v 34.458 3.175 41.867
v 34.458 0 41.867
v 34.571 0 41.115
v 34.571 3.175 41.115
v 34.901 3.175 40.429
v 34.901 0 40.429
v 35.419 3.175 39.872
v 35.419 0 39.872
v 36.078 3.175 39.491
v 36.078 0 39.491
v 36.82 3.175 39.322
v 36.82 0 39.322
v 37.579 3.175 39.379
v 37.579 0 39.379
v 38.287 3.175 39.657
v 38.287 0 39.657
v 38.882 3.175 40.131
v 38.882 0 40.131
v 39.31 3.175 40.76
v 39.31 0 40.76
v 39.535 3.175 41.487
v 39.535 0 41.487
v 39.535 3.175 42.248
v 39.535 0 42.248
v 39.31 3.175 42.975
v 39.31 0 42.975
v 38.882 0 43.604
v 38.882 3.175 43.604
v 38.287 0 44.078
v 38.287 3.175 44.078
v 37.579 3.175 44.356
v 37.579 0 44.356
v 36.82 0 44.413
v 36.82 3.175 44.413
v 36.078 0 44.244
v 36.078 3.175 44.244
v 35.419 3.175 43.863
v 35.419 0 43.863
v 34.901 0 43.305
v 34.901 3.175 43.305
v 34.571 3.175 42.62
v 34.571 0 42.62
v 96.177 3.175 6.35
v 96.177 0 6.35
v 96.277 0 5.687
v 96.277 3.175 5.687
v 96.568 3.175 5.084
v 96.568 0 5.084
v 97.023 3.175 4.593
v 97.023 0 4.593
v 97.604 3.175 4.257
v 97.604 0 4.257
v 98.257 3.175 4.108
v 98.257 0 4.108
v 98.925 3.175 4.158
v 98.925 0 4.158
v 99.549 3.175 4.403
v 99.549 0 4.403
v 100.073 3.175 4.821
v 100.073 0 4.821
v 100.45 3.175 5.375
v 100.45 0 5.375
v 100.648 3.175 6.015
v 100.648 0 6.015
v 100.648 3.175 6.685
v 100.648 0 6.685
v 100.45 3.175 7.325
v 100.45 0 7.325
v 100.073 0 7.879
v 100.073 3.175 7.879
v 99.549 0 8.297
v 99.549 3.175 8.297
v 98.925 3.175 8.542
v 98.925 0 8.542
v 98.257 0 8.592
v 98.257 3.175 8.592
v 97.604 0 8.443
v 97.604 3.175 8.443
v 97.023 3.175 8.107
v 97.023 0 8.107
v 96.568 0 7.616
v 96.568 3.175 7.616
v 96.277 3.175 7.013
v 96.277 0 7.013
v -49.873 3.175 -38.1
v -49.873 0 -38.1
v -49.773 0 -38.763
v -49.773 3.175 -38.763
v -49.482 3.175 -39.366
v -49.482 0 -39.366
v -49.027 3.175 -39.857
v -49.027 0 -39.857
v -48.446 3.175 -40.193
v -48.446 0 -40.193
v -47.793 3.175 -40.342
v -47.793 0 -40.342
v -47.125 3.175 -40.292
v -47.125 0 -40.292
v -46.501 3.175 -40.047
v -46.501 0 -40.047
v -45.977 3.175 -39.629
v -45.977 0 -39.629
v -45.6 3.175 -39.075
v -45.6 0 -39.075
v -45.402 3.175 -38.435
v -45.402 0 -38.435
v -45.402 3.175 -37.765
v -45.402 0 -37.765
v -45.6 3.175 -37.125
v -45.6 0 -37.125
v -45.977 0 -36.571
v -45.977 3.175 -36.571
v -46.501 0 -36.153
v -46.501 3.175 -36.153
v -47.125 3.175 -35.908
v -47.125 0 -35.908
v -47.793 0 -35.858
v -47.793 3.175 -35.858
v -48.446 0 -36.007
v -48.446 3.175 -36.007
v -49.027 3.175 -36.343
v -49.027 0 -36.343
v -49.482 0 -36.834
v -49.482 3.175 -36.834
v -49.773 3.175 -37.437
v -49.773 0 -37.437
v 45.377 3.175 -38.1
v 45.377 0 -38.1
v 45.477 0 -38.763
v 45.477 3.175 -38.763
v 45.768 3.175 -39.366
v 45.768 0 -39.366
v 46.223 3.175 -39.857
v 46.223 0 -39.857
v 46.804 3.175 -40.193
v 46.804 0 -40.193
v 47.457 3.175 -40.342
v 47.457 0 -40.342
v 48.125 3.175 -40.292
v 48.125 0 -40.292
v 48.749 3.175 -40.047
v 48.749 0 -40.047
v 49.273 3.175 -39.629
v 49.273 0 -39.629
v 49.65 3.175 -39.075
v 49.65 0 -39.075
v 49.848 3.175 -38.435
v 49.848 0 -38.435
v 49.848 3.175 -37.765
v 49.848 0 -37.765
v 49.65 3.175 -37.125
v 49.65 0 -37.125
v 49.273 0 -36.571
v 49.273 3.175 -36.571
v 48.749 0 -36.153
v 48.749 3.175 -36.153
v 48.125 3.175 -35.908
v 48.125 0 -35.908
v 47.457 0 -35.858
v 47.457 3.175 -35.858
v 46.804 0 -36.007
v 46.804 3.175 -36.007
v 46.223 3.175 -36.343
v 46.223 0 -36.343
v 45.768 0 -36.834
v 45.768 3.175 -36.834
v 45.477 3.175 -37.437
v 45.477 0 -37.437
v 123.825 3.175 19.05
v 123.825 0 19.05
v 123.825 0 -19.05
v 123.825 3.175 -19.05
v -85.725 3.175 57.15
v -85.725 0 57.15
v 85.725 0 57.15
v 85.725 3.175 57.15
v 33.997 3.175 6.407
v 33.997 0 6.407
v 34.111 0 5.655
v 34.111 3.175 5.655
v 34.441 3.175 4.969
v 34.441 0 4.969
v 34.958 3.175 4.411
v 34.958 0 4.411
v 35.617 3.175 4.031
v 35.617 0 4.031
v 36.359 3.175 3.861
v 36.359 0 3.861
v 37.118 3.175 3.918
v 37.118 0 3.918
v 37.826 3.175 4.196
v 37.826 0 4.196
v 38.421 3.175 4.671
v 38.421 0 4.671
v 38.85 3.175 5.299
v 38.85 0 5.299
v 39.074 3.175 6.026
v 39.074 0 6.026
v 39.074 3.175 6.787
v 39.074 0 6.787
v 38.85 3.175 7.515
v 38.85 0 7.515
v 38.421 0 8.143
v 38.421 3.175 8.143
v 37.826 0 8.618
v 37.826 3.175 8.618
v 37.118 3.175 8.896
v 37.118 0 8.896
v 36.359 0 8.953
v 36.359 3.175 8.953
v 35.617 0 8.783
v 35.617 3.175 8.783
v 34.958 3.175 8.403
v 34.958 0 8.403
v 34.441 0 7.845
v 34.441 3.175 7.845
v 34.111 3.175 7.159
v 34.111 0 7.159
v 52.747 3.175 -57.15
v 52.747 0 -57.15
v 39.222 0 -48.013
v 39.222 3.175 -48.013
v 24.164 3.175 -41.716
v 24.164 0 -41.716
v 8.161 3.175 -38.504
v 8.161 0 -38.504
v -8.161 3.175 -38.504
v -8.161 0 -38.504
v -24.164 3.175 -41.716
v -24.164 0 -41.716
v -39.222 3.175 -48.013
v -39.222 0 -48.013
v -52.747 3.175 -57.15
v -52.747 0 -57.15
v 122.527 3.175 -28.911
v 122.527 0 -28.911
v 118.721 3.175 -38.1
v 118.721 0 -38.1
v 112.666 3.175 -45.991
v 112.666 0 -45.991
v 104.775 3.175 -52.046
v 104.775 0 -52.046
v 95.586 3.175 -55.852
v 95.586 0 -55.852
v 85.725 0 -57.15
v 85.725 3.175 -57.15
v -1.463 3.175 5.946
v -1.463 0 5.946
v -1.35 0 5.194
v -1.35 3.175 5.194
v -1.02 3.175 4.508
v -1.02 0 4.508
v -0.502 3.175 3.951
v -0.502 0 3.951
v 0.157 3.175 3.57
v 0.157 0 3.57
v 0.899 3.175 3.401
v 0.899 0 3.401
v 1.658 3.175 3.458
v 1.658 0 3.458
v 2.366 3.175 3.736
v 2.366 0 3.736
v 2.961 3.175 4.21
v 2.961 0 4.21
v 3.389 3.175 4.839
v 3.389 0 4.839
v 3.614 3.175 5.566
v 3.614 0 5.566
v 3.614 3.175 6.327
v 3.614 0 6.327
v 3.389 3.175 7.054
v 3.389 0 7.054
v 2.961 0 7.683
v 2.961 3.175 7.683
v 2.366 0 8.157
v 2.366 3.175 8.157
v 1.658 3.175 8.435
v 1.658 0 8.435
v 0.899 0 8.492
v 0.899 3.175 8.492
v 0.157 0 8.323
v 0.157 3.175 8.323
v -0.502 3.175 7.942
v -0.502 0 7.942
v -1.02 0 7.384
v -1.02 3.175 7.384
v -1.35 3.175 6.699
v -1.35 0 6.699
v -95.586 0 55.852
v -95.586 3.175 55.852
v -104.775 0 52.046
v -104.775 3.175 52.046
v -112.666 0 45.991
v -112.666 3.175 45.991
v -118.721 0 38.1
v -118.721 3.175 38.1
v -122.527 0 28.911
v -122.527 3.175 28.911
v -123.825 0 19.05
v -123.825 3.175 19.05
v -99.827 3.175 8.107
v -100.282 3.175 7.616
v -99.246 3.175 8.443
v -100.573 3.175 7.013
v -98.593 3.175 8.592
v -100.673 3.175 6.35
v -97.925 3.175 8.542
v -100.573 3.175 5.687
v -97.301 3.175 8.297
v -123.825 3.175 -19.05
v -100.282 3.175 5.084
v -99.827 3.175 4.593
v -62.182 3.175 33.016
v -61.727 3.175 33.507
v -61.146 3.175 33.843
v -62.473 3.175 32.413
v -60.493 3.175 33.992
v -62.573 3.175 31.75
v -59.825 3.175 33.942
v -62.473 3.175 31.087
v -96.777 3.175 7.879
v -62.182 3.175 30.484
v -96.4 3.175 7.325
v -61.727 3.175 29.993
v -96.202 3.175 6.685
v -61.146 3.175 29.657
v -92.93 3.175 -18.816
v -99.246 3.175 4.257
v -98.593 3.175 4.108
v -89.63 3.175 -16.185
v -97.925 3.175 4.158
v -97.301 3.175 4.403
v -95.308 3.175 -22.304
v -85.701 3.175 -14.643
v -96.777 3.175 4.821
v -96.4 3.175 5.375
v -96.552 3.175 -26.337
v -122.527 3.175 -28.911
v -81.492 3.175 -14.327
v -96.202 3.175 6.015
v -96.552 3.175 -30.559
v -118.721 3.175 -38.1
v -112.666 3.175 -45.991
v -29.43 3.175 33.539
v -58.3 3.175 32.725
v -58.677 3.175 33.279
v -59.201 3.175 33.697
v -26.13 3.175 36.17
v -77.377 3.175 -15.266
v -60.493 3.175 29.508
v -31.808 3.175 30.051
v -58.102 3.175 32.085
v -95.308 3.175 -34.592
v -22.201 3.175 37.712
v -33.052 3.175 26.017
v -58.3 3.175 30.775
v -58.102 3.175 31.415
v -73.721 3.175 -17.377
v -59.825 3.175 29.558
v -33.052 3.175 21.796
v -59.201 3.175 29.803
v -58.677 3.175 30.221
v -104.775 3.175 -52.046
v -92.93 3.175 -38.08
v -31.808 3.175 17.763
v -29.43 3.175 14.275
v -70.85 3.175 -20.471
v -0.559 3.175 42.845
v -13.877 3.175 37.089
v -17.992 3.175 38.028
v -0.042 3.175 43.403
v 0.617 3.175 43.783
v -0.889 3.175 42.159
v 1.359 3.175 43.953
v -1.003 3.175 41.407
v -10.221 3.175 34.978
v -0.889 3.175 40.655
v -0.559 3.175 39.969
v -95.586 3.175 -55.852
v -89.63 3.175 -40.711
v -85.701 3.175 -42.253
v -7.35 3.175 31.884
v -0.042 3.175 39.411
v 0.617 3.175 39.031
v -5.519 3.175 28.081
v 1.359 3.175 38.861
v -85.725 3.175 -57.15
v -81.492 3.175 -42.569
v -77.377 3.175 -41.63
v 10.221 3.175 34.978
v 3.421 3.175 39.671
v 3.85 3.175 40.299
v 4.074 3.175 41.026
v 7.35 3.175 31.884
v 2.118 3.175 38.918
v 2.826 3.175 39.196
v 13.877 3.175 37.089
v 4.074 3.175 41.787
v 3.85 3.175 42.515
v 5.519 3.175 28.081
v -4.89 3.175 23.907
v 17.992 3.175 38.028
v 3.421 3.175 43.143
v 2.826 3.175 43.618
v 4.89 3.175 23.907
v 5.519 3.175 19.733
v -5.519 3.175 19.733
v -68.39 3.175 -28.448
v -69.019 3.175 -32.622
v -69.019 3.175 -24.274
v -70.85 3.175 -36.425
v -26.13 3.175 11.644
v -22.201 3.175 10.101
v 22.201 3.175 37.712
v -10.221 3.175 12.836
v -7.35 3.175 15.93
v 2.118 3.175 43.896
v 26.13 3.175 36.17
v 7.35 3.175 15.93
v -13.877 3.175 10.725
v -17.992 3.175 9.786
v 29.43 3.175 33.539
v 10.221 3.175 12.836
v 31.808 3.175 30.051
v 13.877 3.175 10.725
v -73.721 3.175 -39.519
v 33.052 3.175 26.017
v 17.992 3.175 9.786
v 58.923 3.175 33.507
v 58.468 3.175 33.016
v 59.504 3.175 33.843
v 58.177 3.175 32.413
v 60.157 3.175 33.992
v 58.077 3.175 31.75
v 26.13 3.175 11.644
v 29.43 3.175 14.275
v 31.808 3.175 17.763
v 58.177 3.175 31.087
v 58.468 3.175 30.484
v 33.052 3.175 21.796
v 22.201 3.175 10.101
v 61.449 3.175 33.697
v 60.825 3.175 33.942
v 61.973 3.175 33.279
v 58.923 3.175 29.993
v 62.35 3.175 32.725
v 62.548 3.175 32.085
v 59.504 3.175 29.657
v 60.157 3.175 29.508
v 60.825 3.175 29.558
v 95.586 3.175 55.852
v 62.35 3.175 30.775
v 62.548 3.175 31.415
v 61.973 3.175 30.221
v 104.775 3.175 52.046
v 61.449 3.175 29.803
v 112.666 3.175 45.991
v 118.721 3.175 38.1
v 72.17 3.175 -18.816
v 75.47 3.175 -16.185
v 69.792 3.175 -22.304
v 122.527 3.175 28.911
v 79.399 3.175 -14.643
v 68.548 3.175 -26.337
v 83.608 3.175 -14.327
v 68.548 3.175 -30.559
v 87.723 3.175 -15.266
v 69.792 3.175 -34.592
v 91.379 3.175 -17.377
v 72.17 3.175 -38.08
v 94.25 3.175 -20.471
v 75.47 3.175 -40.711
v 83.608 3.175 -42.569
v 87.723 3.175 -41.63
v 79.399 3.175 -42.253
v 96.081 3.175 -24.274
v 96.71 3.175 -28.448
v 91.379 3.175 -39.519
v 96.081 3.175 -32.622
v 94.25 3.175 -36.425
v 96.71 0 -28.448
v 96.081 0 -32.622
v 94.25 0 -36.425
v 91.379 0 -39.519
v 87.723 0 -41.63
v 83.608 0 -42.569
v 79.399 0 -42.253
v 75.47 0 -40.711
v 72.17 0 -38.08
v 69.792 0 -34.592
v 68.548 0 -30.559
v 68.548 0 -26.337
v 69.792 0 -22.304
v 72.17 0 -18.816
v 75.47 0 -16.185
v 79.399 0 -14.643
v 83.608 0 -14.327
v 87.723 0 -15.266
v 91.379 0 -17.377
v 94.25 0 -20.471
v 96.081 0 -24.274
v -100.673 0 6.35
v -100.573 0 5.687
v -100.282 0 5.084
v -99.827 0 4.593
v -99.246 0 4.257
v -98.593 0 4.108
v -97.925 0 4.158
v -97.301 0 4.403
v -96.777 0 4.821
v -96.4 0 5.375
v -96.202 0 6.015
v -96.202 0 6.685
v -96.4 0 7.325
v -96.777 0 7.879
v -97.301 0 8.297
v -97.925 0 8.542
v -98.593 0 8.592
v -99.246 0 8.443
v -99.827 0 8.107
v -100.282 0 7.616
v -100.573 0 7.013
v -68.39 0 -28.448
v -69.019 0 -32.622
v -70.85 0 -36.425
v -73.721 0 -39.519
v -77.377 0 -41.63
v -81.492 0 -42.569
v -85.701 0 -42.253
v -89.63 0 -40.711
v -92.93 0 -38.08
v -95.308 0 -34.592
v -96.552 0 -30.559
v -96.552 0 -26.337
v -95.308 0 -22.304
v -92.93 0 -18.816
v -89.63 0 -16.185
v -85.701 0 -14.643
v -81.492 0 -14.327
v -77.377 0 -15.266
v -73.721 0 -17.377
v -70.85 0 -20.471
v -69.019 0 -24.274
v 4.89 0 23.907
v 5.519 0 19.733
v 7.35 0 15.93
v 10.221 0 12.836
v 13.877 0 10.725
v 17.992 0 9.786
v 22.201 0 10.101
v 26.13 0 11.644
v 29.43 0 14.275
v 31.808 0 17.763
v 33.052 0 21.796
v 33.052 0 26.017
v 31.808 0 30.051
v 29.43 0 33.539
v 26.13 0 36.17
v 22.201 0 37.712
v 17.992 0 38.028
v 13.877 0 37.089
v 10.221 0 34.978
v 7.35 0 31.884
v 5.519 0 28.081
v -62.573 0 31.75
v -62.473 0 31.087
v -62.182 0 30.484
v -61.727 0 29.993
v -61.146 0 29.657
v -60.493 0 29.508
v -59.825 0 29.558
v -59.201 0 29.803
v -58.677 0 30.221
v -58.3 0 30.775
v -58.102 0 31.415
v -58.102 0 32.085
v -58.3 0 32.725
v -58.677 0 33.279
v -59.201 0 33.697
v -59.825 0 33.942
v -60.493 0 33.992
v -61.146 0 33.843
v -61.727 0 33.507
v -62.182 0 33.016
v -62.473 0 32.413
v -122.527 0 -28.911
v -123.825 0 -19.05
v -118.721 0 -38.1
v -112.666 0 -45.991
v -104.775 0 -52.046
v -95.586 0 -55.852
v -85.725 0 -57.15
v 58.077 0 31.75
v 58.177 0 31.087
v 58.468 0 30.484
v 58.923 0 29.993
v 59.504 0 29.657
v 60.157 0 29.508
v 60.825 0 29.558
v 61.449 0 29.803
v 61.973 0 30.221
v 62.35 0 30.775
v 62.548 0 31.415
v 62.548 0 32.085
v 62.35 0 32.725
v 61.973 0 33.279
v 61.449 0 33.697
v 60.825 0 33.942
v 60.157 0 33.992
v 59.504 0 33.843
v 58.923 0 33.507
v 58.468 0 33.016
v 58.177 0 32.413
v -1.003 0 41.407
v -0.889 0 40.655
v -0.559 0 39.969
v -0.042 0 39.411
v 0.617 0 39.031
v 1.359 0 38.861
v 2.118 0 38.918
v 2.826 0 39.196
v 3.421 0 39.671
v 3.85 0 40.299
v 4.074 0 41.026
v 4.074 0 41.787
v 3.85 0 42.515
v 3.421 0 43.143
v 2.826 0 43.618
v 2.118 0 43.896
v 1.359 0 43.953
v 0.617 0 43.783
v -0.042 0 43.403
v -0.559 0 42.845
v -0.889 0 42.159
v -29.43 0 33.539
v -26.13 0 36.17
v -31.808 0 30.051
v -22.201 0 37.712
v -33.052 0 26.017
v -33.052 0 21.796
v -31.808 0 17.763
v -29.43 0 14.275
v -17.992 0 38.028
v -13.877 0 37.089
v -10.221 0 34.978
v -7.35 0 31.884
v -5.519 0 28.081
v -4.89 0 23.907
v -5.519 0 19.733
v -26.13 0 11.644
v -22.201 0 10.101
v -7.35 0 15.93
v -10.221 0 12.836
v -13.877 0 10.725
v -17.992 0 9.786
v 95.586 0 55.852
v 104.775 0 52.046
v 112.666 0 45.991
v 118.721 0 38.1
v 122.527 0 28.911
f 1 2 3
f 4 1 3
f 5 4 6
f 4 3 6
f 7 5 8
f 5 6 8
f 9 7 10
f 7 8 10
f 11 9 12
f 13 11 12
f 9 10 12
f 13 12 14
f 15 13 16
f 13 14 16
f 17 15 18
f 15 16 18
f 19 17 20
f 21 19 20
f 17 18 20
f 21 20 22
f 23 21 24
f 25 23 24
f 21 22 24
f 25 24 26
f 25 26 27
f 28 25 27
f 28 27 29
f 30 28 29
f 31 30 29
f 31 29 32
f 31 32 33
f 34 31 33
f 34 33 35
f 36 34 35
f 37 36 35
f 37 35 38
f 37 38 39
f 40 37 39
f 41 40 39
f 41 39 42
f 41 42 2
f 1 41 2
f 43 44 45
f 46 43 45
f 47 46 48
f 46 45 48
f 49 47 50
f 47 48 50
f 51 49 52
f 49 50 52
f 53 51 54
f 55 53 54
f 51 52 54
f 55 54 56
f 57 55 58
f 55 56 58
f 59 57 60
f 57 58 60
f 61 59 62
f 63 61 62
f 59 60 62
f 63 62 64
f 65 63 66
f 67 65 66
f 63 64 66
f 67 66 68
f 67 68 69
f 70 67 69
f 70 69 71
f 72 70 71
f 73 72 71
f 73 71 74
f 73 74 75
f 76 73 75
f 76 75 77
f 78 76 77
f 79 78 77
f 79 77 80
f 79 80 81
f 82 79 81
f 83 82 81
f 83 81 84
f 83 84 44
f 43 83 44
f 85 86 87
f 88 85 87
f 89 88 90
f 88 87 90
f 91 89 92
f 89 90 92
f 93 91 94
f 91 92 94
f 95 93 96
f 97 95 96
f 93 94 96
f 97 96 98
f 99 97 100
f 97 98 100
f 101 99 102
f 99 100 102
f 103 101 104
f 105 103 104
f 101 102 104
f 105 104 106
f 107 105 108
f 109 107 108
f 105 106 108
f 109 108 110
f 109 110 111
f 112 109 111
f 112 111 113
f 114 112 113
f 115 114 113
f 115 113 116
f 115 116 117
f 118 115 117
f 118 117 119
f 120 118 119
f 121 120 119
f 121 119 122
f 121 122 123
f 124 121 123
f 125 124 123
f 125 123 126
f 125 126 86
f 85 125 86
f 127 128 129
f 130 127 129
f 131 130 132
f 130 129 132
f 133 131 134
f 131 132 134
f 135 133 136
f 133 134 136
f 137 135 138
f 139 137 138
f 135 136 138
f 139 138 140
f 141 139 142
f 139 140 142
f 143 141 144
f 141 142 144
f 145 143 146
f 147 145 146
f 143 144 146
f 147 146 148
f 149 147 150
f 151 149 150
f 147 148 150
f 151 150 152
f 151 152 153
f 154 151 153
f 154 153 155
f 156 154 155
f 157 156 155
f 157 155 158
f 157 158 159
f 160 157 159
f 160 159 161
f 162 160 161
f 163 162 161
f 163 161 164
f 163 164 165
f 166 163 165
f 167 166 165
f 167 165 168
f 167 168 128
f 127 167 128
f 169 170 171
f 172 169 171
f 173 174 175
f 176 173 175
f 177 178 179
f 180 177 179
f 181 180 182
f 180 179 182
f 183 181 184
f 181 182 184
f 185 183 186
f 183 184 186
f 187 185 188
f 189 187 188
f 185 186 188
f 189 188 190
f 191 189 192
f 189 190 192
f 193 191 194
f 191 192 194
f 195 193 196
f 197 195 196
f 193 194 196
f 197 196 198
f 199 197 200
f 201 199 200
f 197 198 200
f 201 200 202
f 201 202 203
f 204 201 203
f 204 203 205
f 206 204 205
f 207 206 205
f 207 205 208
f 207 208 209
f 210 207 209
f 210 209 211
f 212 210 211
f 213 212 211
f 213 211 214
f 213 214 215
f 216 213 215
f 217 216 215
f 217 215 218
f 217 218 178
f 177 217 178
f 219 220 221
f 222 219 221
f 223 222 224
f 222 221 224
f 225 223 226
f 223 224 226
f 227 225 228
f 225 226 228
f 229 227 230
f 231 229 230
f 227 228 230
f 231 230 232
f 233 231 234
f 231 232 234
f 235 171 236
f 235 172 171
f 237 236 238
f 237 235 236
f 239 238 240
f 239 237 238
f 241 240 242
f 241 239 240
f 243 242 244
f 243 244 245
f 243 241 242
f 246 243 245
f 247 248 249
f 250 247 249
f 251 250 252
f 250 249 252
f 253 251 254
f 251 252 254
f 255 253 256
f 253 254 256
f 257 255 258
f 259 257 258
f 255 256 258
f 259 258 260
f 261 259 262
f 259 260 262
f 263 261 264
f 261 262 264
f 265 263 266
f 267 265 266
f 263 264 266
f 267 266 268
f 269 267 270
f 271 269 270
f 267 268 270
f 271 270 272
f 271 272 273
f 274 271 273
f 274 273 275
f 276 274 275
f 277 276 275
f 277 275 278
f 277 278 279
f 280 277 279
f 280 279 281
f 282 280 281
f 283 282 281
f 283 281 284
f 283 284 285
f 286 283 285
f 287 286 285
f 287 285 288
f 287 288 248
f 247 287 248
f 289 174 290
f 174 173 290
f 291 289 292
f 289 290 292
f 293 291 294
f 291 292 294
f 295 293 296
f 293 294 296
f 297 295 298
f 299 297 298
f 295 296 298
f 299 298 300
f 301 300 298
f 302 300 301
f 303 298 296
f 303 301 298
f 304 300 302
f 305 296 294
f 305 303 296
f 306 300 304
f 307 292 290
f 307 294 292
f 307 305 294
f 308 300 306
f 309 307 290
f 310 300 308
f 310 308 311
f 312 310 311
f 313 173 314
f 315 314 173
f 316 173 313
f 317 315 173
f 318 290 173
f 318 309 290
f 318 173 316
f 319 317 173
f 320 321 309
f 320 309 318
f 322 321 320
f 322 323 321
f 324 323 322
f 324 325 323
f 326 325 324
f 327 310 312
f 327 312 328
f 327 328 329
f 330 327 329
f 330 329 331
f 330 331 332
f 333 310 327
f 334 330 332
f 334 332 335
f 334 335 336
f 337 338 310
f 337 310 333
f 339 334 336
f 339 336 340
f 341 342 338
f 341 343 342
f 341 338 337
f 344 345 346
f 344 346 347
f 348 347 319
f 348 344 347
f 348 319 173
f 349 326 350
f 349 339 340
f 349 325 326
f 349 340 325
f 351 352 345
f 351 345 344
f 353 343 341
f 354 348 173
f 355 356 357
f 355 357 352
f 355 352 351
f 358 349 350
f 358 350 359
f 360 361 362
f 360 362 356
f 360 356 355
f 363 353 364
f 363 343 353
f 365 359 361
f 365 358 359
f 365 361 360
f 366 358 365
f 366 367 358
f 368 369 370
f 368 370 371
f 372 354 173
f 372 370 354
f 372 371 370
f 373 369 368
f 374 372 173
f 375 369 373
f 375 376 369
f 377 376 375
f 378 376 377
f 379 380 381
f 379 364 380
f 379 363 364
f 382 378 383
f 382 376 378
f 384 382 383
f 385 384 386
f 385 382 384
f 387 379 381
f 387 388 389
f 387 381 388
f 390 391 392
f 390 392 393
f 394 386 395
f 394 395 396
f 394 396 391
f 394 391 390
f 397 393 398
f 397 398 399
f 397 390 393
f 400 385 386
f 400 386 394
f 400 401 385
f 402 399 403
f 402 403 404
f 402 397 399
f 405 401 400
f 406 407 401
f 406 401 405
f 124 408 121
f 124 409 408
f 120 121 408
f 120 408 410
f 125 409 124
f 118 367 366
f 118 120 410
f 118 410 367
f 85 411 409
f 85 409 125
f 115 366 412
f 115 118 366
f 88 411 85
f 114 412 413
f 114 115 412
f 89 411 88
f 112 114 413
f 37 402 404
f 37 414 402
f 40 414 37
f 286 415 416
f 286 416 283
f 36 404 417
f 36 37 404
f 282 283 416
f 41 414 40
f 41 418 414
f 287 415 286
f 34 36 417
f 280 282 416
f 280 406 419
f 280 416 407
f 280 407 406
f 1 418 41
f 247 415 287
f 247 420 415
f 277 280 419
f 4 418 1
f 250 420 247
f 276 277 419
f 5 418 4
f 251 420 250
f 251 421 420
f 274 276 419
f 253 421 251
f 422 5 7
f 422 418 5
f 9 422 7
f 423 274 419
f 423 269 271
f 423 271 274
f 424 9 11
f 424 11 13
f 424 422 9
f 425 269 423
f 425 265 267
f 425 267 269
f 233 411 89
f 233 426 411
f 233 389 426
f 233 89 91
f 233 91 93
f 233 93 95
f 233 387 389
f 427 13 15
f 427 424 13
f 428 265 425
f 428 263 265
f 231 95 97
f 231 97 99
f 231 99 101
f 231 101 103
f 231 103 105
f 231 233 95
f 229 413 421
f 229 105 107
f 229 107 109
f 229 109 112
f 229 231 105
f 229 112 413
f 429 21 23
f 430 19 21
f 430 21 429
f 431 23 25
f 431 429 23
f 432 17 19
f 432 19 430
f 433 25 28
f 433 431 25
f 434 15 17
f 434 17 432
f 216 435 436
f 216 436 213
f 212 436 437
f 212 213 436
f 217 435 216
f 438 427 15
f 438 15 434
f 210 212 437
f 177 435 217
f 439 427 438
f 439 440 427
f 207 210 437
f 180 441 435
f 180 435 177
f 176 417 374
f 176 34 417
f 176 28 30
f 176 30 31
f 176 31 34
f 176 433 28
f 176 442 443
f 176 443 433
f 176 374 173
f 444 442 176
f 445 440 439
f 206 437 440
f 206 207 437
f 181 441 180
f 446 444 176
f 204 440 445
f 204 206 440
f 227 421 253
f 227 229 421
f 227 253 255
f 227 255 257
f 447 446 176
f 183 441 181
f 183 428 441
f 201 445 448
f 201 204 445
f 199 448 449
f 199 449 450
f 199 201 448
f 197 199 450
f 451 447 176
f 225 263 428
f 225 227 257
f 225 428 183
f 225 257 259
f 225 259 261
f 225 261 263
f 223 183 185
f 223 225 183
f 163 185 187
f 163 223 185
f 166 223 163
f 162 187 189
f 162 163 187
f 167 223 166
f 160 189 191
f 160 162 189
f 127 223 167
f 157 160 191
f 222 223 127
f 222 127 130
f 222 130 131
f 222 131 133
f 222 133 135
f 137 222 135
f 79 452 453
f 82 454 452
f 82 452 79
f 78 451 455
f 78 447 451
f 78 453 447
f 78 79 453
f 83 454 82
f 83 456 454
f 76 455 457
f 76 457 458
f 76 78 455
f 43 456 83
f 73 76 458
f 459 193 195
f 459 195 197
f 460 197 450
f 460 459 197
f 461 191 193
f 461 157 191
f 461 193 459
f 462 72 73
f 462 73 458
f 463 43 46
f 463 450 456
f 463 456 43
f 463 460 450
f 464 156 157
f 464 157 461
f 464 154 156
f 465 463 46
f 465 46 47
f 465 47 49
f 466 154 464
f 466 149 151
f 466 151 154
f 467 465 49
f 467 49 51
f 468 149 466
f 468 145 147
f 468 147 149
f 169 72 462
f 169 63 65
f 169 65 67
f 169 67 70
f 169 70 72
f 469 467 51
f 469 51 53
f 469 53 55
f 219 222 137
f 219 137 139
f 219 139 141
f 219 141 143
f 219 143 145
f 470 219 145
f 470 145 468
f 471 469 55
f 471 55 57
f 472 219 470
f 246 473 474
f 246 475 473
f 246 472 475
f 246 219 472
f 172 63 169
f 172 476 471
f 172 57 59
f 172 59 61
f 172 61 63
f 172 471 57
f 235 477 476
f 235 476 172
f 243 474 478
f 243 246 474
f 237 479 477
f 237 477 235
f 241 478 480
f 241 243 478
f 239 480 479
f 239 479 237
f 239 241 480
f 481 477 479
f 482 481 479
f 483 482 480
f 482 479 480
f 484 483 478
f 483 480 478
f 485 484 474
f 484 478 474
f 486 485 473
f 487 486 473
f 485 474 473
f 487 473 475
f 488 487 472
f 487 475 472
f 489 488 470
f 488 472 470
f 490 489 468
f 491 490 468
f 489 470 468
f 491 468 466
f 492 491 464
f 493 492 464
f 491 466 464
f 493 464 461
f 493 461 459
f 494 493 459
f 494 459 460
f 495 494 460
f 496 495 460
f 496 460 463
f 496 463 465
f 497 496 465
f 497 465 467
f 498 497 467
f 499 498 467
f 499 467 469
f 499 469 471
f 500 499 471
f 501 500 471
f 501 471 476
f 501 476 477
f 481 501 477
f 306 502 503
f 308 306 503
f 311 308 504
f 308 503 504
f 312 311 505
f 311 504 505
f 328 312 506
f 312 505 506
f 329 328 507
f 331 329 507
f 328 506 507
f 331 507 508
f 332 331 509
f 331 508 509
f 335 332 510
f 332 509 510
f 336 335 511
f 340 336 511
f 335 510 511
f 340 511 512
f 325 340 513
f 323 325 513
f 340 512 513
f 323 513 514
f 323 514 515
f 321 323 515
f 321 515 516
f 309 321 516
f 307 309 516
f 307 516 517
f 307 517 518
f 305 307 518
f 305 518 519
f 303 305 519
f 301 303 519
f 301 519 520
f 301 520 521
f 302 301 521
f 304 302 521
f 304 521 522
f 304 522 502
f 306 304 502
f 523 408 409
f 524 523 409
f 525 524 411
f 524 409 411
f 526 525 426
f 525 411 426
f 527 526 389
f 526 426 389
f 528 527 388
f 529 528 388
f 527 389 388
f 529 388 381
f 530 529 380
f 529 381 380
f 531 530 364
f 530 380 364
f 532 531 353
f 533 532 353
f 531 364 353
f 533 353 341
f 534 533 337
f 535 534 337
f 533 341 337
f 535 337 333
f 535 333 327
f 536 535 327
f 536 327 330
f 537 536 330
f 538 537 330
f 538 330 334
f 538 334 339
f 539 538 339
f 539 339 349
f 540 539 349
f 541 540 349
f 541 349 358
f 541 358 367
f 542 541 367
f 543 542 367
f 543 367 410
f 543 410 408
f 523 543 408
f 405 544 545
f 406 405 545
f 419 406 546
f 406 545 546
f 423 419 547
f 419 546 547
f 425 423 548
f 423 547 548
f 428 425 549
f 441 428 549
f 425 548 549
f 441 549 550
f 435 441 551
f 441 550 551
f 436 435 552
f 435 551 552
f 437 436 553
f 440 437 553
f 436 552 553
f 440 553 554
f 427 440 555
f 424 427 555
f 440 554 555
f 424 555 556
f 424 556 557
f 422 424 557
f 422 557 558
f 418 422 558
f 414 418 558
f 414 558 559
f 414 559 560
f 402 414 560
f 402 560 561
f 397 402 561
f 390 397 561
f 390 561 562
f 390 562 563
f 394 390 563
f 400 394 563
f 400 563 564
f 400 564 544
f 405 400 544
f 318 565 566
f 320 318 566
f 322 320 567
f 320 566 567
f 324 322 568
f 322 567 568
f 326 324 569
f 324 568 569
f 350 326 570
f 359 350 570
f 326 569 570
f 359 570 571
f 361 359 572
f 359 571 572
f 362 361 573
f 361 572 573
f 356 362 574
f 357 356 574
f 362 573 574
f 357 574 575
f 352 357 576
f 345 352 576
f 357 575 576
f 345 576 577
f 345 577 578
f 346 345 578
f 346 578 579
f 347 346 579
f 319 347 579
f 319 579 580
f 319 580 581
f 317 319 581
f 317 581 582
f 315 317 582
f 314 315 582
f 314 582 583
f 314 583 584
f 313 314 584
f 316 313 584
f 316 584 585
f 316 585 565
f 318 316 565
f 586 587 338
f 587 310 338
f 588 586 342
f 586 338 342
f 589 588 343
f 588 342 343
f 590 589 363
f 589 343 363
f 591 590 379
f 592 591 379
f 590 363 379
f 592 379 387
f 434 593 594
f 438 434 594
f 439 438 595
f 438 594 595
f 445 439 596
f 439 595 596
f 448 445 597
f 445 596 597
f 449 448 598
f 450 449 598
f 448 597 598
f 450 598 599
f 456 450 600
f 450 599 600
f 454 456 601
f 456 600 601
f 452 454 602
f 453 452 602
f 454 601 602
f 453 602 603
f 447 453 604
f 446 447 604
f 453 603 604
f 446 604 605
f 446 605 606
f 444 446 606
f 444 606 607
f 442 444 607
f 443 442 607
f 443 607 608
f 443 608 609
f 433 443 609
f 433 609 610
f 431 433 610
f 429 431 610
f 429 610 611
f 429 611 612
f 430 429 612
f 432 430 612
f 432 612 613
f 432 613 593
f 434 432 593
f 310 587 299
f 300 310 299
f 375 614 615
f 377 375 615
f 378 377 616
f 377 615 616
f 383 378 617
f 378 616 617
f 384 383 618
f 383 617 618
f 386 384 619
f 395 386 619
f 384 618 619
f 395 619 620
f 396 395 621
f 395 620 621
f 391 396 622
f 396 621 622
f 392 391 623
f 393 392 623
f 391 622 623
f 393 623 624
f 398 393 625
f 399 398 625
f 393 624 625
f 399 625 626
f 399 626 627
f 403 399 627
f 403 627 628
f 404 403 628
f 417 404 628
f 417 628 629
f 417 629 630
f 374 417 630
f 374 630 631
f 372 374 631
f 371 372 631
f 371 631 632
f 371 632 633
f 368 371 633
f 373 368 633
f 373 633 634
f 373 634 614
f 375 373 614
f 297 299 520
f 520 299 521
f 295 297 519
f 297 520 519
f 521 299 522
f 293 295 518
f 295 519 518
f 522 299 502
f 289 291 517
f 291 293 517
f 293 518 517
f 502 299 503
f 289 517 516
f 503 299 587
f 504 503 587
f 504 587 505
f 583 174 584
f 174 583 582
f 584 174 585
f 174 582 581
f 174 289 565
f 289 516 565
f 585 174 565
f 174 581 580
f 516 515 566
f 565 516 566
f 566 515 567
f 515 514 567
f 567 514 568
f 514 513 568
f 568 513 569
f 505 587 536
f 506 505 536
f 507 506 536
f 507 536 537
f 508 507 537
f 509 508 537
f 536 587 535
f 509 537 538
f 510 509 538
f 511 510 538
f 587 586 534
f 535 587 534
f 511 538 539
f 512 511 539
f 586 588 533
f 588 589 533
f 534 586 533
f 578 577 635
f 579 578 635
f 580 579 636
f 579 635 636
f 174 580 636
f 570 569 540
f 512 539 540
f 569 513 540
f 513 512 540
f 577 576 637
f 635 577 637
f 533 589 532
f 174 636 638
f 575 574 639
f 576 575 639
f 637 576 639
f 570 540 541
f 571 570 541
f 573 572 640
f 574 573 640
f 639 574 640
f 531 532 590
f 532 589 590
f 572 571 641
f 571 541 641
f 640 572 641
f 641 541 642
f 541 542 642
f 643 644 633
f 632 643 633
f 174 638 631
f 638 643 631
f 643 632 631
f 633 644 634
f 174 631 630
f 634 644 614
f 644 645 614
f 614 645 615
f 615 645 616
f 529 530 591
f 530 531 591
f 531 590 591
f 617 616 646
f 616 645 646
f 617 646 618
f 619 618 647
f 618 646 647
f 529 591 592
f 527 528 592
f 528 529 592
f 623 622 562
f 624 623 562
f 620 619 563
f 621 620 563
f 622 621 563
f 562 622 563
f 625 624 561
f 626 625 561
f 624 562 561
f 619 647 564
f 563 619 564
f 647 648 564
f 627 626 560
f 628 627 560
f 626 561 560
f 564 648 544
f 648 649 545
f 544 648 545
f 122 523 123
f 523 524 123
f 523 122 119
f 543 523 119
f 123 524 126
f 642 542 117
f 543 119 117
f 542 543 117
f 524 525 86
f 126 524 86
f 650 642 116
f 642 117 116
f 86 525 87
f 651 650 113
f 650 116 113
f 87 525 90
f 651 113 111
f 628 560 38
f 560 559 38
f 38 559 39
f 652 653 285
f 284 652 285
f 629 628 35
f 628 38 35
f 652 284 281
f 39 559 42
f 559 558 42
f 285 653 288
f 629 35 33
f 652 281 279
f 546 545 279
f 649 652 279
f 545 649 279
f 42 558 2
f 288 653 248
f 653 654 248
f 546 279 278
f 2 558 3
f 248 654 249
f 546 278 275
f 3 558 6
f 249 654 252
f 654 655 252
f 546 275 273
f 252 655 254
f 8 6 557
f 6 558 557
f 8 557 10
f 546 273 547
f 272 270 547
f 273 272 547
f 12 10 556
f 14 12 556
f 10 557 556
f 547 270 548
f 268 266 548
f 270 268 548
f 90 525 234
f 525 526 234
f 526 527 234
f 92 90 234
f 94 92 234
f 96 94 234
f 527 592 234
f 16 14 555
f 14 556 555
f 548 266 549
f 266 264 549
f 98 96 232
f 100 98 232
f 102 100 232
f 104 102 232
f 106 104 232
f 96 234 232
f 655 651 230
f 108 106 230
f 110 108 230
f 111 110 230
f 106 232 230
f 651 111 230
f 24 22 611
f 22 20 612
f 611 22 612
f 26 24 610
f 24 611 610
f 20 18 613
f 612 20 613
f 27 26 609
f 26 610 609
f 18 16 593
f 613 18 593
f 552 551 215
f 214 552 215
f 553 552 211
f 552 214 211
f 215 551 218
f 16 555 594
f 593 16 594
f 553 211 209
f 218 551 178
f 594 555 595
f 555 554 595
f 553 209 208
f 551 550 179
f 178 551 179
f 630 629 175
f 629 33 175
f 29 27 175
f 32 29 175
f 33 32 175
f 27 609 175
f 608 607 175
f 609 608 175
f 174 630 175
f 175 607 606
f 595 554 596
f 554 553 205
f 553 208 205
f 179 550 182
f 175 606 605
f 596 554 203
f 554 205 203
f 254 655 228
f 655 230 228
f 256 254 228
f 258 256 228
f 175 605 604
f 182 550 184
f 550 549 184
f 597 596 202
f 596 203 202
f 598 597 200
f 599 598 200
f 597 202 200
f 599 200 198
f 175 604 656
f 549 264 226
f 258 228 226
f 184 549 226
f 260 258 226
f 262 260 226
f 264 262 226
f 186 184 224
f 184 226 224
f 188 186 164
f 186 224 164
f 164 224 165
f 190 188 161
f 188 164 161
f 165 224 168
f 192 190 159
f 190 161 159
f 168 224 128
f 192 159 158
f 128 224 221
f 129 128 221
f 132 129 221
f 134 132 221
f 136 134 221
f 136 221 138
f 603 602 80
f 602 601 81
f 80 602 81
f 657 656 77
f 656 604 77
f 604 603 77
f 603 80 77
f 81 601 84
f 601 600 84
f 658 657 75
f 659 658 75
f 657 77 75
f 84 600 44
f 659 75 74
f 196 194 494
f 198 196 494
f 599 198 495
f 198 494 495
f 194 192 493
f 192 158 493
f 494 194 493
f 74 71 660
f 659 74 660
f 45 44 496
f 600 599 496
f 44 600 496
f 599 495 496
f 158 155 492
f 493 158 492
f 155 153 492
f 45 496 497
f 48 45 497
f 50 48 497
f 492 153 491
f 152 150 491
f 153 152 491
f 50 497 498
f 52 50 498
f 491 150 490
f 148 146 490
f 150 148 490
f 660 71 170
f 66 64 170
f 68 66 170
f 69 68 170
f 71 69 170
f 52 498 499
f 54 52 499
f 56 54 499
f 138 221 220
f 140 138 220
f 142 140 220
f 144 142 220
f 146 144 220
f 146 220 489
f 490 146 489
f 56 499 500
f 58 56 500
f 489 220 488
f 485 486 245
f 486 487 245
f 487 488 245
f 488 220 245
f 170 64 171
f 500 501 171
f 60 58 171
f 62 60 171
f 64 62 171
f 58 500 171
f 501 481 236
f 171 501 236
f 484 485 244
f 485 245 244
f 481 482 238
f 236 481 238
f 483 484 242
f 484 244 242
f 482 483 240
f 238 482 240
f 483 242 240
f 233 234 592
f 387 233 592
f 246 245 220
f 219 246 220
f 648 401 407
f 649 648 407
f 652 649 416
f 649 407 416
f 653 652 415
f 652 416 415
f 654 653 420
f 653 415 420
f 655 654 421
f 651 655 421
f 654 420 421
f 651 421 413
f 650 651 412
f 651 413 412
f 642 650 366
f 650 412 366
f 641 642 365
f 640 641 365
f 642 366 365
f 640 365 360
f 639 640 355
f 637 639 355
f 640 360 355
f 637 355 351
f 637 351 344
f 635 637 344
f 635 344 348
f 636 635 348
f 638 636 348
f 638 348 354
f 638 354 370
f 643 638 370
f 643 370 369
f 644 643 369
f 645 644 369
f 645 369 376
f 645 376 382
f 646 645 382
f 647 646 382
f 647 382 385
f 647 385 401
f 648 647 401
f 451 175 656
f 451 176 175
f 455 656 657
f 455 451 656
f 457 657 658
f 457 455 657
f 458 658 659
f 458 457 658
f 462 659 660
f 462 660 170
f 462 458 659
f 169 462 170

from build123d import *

# Parameters (mm, degrees)
BOSS_EXTRUDE1_DEPTH     = 3.175
F_1_1_115_DOWEL_HOLE1_D = 28.321
F_10_CLEARANCE_HOLE1_D  = 5.1054
FILLET1_R               = 38.1
F_1_1_115_DOWEL_HOLE2_D = 28.321
F_8_CLEARANCE_HOLE_D    = 4.4958
F_1_1_115_DOWEL_HOLE3_D = 28.321


with BuildPart() as part:
    # Sketch1 → Boss-Extrude1 (new body)
    with BuildSketch(Plane(origin=(0, 0, 0), x_dir=(1, 0, 0), z_dir=(0, 1, 0))):
        with BuildLine():
            Line((-123.825, -57.15), (123.825, -57.15))
            Line((123.825, -57.15), (123.825, 57.15))
            Line((123.825, 57.15), (52.74706153, 57.15))
            ThreePointArc((52.74706153, 57.15), (0, 38.1), (-52.74706153, 57.15))
            Line((-52.74706153, 57.15), (-123.825, 57.15))
            Line((-123.825, 57.15), (-123.825, -57.15))
        make_face()
    extrude(amount=BOSS_EXTRUDE1_DEPTH)

    # 1 (1.115) Dowel Hole1 (through all)
    with Locations(Plane(origin=(0, 3.175, 0), x_dir=(1, 0, 0), z_dir=(0, 1, 0))):
        with Locations((19.05, -23.906942448)):
            Hole(F_1_1_115_DOWEL_HOLE1_D / 2)

    # #10 Clearance Hole1 (through all)
    with Locations(Plane(origin=(0, 3.175, 0), x_dir=(1, 0, 0), z_dir=(0, 1, 0))):
        with Locations((1.55, -41.406942448), (36.55, -6.406942448), (1.089487758, -5.946430205), (37.010512242, -41.86745469)):
            Hole(F_10_CLEARANCE_HOLE1_D / 2)

    # Fillet1
    fillet1_edges = [part.edges().sort_by_distance(p)[0] for p in [
        (-123.825, 1.5875, -57.15),
        (-123.825, 1.5875, 57.15),
        (123.825, 1.5875, 57.15),
        (123.825, 1.5875, -57.15),
    ]]
    fillet(fillet1_edges, radius=FILLET1_R)

    # 1 (1.115) Dowel Hole2 (through all)
    with Locations(Plane(origin=(0, -34.925, 0), x_dir=(-1, 0, 0), z_dir=(0, -1, 0))):
        with Locations((82.55, 28.448), (-82.55, 28.448)):
            Hole(F_1_1_115_DOWEL_HOLE2_D / 2)

    # #8 Clearance Hole (through all)
    with Locations(Plane(origin=(0, 3.175, 0), x_dir=(1, 0, 0), z_dir=(0, 1, 0))):
        with Locations((-98.425, -6.35), (-60.325, -31.75), (-47.625, 38.1), (47.625, 38.1), (60.325, -31.75), (98.425, -6.35)):
            Hole(F_8_CLEARANCE_HOLE_D / 2)

    # 1 (1.115) Dowel Hole3 (through all)
    with Locations(Plane(origin=(0, -34.925, 0), x_dir=(-1, 0, 0), z_dir=(0, -1, 0))):
        with Locations((19.05, -23.906942448)):
            Hole(F_1_1_115_DOWEL_HOLE3_D / 2)


solid = part.part
